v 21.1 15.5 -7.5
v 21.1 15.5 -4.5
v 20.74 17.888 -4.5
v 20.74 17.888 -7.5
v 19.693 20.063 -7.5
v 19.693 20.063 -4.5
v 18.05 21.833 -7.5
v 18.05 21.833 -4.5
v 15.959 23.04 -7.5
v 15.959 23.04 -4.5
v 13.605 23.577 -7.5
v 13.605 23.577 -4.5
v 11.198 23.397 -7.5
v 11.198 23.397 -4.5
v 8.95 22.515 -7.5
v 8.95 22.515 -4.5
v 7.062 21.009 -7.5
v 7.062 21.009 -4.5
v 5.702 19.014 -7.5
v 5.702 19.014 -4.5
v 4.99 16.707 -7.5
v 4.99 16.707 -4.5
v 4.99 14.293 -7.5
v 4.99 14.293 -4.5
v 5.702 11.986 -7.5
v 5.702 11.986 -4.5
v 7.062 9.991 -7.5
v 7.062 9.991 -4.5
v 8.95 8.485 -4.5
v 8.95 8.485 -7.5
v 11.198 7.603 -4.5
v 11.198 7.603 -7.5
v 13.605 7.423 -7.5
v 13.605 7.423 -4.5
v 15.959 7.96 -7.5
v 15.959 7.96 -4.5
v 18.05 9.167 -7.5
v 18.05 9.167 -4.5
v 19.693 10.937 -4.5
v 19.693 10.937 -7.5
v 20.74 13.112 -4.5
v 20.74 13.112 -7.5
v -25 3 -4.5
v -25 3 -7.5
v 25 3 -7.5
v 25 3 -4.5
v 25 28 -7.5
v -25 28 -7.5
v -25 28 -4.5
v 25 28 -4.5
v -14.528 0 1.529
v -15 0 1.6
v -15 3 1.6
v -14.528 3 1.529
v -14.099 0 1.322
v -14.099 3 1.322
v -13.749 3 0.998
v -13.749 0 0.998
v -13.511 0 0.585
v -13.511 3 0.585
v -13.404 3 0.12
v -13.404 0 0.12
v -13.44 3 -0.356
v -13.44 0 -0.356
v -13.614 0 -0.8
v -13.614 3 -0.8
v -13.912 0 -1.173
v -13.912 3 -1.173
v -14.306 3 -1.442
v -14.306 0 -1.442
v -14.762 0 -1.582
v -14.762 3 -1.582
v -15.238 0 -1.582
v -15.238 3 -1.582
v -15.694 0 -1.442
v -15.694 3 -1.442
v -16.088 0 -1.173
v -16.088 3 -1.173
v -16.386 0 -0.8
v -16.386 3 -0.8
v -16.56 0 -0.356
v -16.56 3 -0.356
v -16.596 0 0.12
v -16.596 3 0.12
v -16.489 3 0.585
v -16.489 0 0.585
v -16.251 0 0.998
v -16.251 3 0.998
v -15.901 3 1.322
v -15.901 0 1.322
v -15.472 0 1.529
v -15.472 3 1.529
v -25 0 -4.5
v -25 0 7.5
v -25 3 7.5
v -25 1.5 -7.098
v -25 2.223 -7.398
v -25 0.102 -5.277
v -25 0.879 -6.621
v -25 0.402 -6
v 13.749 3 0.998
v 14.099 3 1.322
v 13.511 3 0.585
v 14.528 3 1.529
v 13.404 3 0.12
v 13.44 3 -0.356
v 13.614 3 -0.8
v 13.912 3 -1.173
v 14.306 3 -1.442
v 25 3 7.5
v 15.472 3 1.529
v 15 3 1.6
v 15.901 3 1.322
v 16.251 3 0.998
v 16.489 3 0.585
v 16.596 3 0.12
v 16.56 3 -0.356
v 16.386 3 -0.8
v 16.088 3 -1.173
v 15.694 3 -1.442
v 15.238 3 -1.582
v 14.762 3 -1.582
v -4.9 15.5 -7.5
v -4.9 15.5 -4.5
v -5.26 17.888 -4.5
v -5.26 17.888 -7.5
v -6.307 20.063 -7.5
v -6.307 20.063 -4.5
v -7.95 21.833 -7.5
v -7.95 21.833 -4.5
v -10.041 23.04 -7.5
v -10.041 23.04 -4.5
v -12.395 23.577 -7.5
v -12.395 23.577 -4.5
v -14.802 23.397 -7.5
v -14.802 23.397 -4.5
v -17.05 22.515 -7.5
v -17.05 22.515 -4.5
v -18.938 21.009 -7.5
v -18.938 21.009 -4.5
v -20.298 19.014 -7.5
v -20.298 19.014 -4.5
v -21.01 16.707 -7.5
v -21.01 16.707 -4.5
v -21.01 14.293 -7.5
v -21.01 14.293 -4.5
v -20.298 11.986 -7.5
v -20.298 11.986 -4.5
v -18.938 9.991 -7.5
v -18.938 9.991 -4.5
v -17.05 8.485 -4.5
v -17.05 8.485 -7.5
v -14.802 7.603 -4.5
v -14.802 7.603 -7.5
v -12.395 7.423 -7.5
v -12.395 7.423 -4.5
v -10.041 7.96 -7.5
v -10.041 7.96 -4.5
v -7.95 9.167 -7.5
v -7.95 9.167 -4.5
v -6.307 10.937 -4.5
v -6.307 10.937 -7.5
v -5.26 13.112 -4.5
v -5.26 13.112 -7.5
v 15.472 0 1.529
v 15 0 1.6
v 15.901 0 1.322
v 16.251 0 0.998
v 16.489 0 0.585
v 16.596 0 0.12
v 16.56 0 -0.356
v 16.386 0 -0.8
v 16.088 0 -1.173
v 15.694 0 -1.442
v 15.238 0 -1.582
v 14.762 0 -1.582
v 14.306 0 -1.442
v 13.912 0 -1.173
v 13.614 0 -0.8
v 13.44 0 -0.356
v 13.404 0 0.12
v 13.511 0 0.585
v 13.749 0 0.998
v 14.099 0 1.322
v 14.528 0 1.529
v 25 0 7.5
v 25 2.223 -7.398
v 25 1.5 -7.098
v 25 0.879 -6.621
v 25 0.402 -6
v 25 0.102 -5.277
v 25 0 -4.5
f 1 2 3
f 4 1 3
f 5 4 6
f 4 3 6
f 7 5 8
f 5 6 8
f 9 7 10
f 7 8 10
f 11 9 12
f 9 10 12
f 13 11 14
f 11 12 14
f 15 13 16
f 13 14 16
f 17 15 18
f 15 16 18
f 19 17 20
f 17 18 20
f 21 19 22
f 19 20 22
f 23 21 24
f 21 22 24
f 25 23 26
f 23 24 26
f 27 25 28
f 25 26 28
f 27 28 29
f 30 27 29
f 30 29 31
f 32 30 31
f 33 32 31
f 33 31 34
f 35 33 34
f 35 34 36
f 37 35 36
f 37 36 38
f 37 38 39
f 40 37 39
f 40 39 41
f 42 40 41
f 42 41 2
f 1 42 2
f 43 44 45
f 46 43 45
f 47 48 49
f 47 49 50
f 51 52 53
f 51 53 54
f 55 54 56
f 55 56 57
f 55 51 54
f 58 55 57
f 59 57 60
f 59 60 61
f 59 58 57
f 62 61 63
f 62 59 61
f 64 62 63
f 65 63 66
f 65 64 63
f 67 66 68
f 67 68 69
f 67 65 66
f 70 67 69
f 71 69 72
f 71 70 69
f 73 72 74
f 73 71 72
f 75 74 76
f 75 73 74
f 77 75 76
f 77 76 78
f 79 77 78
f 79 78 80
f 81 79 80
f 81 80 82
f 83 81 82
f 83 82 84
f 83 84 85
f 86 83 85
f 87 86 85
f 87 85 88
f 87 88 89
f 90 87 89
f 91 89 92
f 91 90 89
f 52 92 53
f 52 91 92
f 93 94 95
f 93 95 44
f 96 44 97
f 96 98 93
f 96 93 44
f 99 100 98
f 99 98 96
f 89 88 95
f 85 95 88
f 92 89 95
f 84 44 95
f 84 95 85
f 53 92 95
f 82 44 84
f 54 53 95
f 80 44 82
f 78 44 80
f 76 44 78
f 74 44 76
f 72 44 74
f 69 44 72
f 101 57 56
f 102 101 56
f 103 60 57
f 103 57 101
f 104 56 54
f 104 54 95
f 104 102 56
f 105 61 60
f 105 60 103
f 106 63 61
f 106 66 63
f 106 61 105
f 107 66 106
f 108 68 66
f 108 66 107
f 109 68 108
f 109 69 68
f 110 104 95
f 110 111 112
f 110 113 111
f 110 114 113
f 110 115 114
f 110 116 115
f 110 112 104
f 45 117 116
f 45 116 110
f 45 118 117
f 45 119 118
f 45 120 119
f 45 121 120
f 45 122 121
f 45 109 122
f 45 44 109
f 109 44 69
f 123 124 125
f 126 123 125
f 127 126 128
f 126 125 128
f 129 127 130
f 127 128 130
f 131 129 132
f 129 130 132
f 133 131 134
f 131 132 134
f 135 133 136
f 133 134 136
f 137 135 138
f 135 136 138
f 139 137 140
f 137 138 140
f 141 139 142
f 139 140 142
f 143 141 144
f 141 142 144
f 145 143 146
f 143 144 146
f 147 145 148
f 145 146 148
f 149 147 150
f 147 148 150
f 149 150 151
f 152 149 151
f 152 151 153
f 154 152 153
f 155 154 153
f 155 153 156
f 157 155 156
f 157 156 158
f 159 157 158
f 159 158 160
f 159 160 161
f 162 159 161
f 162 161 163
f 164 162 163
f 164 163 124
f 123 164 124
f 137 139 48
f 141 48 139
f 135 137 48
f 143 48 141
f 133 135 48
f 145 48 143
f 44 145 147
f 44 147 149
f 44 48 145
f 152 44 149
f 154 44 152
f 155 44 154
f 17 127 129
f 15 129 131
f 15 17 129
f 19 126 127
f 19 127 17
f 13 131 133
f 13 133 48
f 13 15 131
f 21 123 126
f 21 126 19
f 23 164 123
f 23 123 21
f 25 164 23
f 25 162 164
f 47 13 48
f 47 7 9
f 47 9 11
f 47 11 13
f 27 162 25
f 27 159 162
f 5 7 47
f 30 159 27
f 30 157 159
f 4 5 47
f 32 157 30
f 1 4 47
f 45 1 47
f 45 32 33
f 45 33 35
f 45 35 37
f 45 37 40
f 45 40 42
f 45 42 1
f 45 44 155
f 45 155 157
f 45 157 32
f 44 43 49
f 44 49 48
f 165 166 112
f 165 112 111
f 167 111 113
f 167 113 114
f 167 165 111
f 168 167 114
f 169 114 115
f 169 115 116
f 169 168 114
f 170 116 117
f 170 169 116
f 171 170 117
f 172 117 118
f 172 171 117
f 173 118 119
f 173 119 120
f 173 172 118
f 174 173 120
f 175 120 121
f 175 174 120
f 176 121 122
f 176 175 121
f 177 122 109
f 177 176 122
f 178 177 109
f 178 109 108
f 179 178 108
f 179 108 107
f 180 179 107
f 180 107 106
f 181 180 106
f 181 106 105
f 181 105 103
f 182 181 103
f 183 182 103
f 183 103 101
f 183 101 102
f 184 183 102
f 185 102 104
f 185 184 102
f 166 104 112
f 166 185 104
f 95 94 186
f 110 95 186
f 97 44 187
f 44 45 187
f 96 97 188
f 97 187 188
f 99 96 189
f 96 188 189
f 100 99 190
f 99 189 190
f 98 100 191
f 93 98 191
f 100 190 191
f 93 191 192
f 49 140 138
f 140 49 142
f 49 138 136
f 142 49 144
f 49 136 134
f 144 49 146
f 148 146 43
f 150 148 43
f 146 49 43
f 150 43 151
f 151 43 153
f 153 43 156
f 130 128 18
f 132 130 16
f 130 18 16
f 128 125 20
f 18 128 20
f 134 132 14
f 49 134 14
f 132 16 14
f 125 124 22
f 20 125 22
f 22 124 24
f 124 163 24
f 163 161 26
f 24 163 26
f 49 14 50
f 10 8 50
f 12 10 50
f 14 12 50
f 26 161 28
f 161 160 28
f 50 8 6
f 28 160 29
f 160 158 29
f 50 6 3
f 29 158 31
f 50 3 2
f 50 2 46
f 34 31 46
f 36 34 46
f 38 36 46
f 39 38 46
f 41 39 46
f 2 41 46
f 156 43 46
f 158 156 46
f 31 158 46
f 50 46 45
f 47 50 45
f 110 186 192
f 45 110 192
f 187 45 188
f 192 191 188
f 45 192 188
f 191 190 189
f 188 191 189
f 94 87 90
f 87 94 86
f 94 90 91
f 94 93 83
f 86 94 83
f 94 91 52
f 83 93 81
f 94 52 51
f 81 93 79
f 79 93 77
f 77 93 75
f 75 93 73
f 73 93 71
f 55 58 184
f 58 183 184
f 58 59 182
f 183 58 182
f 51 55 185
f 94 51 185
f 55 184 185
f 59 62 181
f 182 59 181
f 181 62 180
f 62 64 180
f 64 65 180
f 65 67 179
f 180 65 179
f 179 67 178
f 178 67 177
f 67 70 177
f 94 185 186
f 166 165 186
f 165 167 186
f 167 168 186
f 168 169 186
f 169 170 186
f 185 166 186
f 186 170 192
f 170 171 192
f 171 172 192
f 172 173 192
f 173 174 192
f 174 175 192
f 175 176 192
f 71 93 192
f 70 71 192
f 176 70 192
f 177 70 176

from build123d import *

# Parameters (mm, degrees)
SKETCH1_W           = 50
SKETCH1_H           = 15
SKETCH1_R           = 1.6
BOSS_EXTRUDE1_DEPTH = 3
SKETCH3_W           = 50
SKETCH3_H           = 3
BOSS_EXTRUDE3_DEPTH = 25
SKETCH4_R           = 8.1
CUT_EXTRUDE1_DEPTH  = 40.40812099
FILLET8_R           = 3


with BuildPart() as part:
    # Sketch1 → Boss-Extrude1 (new body)
    with BuildSketch(Plane(origin=(0, 0, 0), x_dir=(1, 0, 0), z_dir=(0, 1, 0))):
        Rectangle(SKETCH1_W, SKETCH1_H)
        with Locations(Location((-15, 0, 0), (0, 0, 270))):
            Circle(SKETCH1_R, mode=Mode.SUBTRACT)
        with Locations(Location((15, 0, 0), (0, 0, 270))):
            Circle(SKETCH1_R, mode=Mode.SUBTRACT)
    extrude(amount=BOSS_EXTRUDE1_DEPTH)

    # Fillet8
    fillet8_edges = [part.edges().sort_by_distance(p)[0] for p in [
        (0, 0, -7.5),
    ]]
    fillet(fillet8_edges, radius=FILLET8_R - 0.0001)  # a hair under: the kernel refuses the full size


with BuildPart() as body_2:
    # Sketch3 → Boss-Extrude3 (new body)
    with BuildSketch(Plane(origin=(0, 3, 0), x_dir=(1, 0, 0), z_dir=(0, 1, 0))):
        with Locations((0, 6)):
            Rectangle(SKETCH3_W, SKETCH3_H)
    extrude(amount=BOSS_EXTRUDE3_DEPTH)

    # Sketch4 → Cut-Extrude1 (cut, through all)
    with BuildSketch(Plane.XY.offset(-4.5)):
        with Locations((-13, 15.5)):
            Circle(SKETCH4_R)
        with Locations((13, 15.5)):
            Circle(SKETCH4_R)
    extrude(amount=-CUT_EXTRUDE1_DEPTH, mode=Mode.SUBTRACT)


solid = Compound([part.part, body_2.part])
